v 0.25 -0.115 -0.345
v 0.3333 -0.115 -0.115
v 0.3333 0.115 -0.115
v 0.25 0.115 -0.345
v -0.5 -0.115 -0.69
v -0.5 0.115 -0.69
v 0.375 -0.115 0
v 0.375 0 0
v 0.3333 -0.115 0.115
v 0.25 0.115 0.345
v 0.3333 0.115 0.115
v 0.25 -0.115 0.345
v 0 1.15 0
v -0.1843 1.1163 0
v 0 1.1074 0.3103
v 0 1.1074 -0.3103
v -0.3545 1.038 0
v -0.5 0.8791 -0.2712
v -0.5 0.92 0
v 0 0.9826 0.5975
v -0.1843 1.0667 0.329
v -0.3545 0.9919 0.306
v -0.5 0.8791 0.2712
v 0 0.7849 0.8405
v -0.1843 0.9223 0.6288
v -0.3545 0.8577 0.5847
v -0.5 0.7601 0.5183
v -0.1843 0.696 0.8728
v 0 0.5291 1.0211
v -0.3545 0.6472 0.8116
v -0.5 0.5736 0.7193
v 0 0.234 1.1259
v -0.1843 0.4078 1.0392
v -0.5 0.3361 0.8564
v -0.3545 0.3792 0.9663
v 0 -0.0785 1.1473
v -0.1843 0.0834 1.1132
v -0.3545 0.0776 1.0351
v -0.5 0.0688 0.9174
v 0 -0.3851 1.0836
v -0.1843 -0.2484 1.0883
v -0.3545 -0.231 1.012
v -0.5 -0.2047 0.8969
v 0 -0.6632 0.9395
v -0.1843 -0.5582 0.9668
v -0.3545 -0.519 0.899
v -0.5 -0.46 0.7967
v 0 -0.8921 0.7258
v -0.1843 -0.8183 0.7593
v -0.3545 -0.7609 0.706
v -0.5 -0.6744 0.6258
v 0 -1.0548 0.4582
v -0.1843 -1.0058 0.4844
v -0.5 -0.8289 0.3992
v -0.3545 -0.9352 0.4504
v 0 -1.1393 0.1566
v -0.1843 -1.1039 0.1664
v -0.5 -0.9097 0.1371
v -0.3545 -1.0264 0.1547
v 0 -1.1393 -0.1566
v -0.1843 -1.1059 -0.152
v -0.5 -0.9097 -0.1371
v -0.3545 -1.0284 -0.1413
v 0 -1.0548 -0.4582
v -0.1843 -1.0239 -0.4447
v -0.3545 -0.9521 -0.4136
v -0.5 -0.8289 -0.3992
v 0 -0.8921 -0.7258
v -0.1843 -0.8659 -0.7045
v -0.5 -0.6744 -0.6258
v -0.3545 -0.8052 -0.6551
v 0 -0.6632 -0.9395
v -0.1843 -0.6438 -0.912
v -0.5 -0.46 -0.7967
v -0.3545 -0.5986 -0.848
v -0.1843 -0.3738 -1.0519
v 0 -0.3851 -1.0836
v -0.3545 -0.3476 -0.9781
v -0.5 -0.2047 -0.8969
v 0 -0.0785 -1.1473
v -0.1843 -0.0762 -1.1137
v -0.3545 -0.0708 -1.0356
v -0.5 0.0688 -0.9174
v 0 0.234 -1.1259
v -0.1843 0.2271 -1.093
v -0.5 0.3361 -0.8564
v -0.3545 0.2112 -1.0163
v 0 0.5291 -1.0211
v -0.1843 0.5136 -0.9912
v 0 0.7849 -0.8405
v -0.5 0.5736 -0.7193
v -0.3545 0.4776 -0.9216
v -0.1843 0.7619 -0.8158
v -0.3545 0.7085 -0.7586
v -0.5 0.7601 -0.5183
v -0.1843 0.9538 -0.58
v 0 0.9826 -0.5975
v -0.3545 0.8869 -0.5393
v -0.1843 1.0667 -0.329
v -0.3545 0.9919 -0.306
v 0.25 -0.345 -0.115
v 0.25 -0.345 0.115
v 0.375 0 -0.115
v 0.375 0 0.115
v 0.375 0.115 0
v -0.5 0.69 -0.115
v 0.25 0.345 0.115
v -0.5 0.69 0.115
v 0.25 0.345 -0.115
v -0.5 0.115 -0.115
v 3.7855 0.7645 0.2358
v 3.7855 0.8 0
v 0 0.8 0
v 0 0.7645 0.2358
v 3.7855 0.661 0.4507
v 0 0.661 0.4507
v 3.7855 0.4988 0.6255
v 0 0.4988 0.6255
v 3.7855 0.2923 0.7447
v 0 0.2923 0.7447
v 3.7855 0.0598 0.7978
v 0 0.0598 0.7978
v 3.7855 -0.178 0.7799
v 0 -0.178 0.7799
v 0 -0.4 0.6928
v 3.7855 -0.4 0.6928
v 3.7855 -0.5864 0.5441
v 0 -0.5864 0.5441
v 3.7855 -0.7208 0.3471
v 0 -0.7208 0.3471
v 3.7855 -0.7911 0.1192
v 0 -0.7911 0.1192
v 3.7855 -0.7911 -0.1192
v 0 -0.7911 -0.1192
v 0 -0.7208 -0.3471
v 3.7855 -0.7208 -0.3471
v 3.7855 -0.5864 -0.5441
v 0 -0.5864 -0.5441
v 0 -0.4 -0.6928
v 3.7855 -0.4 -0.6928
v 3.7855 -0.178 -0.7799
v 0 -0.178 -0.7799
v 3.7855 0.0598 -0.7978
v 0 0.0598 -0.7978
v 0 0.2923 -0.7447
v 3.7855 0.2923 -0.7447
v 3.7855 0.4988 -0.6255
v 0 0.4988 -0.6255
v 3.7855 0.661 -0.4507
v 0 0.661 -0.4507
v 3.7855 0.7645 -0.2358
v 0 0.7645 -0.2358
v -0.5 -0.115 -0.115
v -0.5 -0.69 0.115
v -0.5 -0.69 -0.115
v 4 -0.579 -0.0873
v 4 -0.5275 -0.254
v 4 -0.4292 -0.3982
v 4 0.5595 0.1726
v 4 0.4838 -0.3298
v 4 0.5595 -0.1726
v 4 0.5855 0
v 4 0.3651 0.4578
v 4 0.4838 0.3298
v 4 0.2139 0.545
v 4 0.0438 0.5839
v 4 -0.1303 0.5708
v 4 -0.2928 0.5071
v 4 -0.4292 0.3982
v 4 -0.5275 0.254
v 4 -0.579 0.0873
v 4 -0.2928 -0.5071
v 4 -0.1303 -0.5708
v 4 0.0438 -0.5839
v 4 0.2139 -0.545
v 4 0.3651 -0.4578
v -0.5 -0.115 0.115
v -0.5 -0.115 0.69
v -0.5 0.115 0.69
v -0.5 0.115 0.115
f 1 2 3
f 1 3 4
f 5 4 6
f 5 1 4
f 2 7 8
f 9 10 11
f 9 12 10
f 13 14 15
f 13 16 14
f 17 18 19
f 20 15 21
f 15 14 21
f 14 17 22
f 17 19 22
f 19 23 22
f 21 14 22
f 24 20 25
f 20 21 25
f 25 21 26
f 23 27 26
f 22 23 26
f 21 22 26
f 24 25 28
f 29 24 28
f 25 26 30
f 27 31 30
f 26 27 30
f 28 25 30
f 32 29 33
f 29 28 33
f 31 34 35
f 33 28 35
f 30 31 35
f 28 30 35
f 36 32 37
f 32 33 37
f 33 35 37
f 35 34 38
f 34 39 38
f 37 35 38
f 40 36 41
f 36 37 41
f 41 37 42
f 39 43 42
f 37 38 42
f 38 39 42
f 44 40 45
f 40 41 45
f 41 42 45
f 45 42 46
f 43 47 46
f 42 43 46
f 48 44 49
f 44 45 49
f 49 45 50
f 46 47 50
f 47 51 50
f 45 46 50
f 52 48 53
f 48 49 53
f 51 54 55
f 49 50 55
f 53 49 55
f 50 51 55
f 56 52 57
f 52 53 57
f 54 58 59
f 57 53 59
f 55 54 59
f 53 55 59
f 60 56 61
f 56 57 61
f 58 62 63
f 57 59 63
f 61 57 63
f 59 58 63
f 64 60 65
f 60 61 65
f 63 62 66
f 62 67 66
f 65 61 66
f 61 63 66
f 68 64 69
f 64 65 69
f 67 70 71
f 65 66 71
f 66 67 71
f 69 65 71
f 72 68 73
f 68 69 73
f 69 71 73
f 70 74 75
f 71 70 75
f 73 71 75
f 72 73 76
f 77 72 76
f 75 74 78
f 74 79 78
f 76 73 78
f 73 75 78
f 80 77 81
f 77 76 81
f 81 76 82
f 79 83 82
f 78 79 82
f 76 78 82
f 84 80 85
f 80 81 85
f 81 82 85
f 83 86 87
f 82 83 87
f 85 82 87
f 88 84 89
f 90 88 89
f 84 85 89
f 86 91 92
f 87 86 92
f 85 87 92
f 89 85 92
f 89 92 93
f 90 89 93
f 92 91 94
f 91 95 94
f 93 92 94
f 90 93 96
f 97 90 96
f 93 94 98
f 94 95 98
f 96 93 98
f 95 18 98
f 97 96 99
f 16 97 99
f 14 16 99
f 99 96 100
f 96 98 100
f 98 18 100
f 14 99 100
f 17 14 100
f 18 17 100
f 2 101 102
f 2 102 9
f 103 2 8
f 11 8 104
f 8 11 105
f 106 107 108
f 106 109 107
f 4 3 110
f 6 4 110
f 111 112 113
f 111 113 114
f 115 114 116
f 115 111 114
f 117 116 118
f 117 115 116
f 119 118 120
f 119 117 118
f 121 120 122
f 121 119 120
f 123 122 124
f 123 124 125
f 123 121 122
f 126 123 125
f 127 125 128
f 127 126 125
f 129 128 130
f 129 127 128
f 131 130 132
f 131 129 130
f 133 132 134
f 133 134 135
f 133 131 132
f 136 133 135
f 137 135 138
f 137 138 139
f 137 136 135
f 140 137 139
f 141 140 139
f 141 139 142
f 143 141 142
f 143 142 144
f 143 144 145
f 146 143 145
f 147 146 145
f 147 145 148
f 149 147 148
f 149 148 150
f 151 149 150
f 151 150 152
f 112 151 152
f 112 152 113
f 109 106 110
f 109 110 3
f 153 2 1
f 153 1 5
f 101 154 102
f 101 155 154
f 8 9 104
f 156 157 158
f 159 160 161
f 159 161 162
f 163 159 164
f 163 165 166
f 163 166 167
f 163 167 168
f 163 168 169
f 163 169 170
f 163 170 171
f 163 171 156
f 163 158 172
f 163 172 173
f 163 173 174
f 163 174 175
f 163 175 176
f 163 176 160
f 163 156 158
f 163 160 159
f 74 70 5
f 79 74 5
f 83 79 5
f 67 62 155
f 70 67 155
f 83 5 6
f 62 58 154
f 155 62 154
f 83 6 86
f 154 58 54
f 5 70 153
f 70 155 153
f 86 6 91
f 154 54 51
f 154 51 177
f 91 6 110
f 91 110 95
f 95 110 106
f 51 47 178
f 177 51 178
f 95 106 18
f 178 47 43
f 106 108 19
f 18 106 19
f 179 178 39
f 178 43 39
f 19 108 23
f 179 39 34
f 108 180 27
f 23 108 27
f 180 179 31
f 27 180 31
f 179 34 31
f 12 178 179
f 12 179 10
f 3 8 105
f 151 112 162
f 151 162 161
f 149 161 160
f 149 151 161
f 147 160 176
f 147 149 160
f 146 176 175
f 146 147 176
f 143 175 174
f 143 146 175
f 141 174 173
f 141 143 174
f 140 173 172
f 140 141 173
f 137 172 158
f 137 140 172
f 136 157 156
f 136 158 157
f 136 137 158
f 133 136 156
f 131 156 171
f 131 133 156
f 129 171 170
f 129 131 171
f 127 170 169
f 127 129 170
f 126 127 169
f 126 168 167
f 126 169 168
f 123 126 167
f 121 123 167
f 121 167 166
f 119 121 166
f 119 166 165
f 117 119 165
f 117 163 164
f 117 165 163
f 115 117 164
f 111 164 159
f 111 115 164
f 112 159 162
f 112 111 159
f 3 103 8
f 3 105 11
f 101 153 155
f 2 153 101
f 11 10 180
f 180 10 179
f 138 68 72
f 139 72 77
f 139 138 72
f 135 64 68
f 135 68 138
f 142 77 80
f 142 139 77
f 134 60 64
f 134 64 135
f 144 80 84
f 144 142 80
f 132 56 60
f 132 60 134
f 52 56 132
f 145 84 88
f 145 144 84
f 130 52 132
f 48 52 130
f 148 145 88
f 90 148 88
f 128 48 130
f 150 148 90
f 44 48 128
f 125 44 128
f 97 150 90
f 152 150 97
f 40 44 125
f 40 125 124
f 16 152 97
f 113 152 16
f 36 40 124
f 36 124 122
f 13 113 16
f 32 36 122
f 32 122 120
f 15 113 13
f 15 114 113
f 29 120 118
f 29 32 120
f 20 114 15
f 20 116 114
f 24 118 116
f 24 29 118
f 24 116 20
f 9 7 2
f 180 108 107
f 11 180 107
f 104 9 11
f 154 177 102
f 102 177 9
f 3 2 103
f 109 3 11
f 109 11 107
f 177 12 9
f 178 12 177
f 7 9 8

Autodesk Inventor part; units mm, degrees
ref_plane "YZ Plane" through (0, 0, 0) normal (1, 0, 0) x (0, 1, 0)
ref_plane "XZ Plane" through (0, 0, 0) normal (0, 1, 0) x (-1, 0, 0)
ref_plane "XY Plane" through (0, 0, 0) normal (0, 0, 1) x (1, 0, 0)
sketch "Sketch_1" plane through (0, 0, 0) normal (0, 0, 1) x (1, 0, 0)
  line L0 (4, 0) -> (-0.5, 0)
  line L1 (-0.5, 0) -> (-0.5, 0.92)
  arc A0 (0, 1.15) -> (-0.5, 0.92) centre (0.0416, 0.4012) ccw
  line L2 (0, 1.15) -> (0, 0.8)
  line L3 (0, 0.8) -> (3.7855, 0.8)
  line L4 (3.7855, 0.8) -> (4, 0.5855)
  line L5 (4, 0.5855) -> (4, 0)
  line L6 (4, 0) -> (-0.5, 0)
revolve "Revolution1" add sketch "Sketch_1" angle 360 about axis through (4, 0, 0) along (1, 0, 0)
thread "Thread1" size "M1.6x0.35" class "6g" standard "ISO Metric profile" length 3.4131
sketch "Sketch_2" plane through (0, 0, 0) normal (0, 0, 1) x (1, 0, 0)
  line L0 (-0.5, -0.69) -> (0.25, -0.345)
  line L1 (0.25, -0.345) -> (0.375, 0)
  line L2 (0.375, 0) -> (0.25, 0.345)
  line L3 (0.25, 0.345) -> (-0.5, 0.69)
  line L4 (-0.5, 0.69) -> (-0.5, -0.69)
extrude "Extrusion1" cut sketch "Sketch_2" along normal mid plane 0.23
sketch "Sketch_3" plane through (0, 0, 0) normal (0, 1, 0) x (-1, 0, 0)
  line L0 (0.5, 0.69) -> (-0.25, 0.345)
  line L1 (-0.25, 0.345) -> (-0.375, 0)
  line L2 (-0.375, 0) -> (-0.25, -0.345)
  line L3 (-0.25, -0.345) -> (0.5, -0.69)
  line L4 (0.5, -0.69) -> (0.5, 0.69)
extrude "Extrusion2" cut sketch "Sketch_3" along normal mid plane 0.23
properties part number "SNZS-M1.6-4"
